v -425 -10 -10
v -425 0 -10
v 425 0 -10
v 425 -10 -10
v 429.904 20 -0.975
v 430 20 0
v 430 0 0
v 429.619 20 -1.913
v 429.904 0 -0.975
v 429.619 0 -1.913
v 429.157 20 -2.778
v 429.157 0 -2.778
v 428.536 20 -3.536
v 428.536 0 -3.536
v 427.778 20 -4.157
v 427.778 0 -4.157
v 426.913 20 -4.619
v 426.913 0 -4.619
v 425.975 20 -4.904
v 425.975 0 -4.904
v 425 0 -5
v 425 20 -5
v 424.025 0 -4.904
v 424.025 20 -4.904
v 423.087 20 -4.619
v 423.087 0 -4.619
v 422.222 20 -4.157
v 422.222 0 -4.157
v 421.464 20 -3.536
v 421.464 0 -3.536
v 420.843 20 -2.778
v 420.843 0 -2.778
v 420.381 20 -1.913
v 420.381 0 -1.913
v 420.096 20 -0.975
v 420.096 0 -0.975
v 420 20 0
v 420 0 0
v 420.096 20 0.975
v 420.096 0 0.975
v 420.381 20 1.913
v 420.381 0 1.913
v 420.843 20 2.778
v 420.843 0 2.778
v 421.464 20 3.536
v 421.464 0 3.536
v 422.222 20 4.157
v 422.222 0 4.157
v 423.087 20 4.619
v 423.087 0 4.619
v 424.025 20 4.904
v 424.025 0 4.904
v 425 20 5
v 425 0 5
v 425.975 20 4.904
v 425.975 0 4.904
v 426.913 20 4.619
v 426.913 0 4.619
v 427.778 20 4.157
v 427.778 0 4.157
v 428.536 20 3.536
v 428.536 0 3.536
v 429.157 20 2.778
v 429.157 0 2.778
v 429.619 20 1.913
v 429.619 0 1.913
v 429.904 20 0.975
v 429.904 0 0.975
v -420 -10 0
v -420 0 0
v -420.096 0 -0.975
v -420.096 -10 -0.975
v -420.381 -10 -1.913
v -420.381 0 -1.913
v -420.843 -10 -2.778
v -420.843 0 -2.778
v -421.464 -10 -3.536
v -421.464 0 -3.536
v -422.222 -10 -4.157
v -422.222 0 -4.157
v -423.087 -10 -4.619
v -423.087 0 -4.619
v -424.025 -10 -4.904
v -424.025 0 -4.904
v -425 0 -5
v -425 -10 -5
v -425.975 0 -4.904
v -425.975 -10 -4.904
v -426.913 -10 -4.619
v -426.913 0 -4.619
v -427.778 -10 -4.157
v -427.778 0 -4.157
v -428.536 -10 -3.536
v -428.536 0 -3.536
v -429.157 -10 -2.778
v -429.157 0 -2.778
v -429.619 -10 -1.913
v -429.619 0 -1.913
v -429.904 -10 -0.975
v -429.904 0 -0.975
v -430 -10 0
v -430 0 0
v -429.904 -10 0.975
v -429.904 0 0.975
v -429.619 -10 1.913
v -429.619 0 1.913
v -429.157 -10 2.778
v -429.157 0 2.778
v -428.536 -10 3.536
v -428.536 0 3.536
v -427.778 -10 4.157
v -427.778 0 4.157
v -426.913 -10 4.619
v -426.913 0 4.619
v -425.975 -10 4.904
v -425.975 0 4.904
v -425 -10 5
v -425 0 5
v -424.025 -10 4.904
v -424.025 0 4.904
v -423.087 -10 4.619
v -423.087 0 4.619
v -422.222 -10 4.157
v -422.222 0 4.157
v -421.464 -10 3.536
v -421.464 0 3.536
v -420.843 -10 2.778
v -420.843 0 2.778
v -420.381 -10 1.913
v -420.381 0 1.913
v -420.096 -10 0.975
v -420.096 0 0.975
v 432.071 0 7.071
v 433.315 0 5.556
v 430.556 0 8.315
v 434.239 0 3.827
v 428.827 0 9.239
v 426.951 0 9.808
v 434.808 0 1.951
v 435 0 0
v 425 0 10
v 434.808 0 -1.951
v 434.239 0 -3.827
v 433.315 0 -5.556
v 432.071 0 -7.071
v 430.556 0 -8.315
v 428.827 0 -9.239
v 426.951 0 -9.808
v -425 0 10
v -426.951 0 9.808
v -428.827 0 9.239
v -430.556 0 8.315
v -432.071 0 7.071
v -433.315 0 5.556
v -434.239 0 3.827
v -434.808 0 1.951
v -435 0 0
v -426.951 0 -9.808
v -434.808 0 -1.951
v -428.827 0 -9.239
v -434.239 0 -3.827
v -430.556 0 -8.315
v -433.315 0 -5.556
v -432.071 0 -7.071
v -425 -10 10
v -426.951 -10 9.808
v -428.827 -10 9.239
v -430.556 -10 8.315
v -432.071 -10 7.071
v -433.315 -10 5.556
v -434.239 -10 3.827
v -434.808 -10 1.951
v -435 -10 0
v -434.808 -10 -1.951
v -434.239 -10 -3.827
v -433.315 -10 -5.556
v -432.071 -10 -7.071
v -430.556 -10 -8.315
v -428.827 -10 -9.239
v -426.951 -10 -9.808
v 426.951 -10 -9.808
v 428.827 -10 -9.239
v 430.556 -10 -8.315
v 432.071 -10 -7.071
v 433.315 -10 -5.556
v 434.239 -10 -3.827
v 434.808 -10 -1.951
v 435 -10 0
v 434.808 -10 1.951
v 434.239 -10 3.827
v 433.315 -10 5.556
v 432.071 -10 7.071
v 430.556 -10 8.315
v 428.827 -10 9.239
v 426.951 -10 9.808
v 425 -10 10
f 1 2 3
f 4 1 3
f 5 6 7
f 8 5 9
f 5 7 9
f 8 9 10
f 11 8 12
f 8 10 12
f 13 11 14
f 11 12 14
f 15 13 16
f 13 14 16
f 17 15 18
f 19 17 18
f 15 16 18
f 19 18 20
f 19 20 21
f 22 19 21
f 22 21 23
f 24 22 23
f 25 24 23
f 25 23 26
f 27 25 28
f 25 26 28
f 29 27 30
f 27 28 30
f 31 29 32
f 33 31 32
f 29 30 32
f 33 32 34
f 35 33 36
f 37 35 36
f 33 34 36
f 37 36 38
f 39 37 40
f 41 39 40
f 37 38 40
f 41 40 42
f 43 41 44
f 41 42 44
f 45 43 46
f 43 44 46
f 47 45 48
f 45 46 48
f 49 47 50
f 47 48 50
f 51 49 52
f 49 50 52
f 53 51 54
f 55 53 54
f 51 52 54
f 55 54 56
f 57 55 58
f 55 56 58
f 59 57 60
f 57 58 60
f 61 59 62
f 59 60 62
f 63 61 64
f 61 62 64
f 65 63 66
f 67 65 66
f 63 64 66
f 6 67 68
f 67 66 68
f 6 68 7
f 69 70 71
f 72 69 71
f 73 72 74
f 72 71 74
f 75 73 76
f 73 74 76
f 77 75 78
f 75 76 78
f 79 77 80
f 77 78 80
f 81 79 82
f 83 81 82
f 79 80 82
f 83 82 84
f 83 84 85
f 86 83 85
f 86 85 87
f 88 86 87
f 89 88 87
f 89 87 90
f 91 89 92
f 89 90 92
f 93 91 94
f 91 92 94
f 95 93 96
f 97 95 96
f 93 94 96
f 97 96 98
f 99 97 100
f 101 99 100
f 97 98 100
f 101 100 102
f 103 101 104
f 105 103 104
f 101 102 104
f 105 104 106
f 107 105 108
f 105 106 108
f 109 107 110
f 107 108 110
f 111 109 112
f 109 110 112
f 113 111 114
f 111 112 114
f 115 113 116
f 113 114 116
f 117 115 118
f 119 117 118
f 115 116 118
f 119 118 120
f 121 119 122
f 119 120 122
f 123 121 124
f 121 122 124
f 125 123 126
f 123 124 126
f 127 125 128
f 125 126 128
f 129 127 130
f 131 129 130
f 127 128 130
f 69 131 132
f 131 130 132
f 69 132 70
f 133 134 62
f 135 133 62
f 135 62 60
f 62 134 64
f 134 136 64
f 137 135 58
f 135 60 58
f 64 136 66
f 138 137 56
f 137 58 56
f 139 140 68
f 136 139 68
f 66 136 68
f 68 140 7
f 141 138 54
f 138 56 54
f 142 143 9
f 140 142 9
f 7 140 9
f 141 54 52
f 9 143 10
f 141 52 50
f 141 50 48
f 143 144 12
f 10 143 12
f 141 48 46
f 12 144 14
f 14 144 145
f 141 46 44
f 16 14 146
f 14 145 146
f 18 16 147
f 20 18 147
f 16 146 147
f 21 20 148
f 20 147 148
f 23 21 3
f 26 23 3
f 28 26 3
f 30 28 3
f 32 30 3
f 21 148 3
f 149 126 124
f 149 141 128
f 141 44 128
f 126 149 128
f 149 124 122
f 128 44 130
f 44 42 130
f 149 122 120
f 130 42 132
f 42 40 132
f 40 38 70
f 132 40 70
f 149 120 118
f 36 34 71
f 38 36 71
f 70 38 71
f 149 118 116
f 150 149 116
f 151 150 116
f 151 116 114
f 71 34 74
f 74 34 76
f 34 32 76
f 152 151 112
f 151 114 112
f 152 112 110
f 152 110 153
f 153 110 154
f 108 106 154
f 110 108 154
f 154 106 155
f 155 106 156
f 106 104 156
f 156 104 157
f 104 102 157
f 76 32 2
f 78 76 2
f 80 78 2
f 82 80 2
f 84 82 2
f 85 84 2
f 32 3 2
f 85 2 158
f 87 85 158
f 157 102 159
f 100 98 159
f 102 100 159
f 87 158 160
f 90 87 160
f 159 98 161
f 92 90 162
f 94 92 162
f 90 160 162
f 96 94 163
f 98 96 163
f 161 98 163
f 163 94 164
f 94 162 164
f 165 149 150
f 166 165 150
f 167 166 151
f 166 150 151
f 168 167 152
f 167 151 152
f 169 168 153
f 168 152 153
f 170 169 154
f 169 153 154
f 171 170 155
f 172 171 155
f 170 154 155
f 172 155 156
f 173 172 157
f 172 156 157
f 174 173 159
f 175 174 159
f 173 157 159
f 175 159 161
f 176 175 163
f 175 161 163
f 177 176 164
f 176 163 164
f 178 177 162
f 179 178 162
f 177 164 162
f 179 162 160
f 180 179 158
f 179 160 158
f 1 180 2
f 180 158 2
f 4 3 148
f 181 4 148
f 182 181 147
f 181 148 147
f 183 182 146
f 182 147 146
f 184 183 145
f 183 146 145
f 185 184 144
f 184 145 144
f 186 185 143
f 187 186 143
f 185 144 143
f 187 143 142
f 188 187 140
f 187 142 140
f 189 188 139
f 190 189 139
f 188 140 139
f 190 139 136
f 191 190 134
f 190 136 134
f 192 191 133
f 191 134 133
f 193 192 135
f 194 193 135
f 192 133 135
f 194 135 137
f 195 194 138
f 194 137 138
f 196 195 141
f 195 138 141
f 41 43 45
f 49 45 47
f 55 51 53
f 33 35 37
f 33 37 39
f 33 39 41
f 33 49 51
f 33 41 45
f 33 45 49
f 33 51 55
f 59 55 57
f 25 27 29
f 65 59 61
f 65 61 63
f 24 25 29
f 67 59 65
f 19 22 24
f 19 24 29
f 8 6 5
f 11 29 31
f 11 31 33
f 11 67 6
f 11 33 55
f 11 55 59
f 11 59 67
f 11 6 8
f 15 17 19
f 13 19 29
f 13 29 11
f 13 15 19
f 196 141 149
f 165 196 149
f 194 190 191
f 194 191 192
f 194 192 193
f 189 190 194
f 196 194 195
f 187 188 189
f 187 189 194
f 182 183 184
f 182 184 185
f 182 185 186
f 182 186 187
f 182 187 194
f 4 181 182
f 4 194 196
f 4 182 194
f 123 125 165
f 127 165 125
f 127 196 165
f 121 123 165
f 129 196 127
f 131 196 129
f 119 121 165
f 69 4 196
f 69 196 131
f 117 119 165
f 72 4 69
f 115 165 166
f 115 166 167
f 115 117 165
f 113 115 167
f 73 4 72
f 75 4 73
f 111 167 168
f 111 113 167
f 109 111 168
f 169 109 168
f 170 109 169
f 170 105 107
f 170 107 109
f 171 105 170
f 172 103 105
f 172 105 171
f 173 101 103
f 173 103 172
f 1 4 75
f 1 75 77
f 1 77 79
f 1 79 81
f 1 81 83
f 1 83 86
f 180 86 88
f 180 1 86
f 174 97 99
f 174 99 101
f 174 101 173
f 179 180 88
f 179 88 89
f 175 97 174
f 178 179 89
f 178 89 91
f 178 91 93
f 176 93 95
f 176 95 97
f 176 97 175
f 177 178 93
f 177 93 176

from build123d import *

# Parameters (mm, degrees)
SKETCH5_R           = 5
BOSS_EXTRUDE1_DEPTH = 10
SKETCH7_R           = 5
BOSS_EXTRUDE2_DEPTH = 20


with BuildPart() as part:
    # Sketch5 → Boss-Extrude1 (new body)
    with BuildSketch(Plane(origin=(0, 0, 0), x_dir=(1, 0, 0), z_dir=(0, 1, 0))):
        with BuildLine():
            Line((-425, 10), (425, 10))
            ThreePointArc((425, 10), (435, 0), (425, -10))
            Line((425, -10), (-425, -10))
            ThreePointArc((-425, -10), (-435, 0), (-425, 10))
        make_face()
        with Locations((-425, 0)):
            Circle(SKETCH5_R, mode=Mode.SUBTRACT)
    extrude(amount=-BOSS_EXTRUDE1_DEPTH)

    # Sketch7 → Boss-Extrude2 (add)
    with BuildSketch(Plane(origin=(0, 0, 0), x_dir=(1, 0, 0), z_dir=(0, 1, 0))):
        with Locations((425, 0)):
            Circle(SKETCH7_R)
    extrude(amount=BOSS_EXTRUDE2_DEPTH)


solid = part.part
